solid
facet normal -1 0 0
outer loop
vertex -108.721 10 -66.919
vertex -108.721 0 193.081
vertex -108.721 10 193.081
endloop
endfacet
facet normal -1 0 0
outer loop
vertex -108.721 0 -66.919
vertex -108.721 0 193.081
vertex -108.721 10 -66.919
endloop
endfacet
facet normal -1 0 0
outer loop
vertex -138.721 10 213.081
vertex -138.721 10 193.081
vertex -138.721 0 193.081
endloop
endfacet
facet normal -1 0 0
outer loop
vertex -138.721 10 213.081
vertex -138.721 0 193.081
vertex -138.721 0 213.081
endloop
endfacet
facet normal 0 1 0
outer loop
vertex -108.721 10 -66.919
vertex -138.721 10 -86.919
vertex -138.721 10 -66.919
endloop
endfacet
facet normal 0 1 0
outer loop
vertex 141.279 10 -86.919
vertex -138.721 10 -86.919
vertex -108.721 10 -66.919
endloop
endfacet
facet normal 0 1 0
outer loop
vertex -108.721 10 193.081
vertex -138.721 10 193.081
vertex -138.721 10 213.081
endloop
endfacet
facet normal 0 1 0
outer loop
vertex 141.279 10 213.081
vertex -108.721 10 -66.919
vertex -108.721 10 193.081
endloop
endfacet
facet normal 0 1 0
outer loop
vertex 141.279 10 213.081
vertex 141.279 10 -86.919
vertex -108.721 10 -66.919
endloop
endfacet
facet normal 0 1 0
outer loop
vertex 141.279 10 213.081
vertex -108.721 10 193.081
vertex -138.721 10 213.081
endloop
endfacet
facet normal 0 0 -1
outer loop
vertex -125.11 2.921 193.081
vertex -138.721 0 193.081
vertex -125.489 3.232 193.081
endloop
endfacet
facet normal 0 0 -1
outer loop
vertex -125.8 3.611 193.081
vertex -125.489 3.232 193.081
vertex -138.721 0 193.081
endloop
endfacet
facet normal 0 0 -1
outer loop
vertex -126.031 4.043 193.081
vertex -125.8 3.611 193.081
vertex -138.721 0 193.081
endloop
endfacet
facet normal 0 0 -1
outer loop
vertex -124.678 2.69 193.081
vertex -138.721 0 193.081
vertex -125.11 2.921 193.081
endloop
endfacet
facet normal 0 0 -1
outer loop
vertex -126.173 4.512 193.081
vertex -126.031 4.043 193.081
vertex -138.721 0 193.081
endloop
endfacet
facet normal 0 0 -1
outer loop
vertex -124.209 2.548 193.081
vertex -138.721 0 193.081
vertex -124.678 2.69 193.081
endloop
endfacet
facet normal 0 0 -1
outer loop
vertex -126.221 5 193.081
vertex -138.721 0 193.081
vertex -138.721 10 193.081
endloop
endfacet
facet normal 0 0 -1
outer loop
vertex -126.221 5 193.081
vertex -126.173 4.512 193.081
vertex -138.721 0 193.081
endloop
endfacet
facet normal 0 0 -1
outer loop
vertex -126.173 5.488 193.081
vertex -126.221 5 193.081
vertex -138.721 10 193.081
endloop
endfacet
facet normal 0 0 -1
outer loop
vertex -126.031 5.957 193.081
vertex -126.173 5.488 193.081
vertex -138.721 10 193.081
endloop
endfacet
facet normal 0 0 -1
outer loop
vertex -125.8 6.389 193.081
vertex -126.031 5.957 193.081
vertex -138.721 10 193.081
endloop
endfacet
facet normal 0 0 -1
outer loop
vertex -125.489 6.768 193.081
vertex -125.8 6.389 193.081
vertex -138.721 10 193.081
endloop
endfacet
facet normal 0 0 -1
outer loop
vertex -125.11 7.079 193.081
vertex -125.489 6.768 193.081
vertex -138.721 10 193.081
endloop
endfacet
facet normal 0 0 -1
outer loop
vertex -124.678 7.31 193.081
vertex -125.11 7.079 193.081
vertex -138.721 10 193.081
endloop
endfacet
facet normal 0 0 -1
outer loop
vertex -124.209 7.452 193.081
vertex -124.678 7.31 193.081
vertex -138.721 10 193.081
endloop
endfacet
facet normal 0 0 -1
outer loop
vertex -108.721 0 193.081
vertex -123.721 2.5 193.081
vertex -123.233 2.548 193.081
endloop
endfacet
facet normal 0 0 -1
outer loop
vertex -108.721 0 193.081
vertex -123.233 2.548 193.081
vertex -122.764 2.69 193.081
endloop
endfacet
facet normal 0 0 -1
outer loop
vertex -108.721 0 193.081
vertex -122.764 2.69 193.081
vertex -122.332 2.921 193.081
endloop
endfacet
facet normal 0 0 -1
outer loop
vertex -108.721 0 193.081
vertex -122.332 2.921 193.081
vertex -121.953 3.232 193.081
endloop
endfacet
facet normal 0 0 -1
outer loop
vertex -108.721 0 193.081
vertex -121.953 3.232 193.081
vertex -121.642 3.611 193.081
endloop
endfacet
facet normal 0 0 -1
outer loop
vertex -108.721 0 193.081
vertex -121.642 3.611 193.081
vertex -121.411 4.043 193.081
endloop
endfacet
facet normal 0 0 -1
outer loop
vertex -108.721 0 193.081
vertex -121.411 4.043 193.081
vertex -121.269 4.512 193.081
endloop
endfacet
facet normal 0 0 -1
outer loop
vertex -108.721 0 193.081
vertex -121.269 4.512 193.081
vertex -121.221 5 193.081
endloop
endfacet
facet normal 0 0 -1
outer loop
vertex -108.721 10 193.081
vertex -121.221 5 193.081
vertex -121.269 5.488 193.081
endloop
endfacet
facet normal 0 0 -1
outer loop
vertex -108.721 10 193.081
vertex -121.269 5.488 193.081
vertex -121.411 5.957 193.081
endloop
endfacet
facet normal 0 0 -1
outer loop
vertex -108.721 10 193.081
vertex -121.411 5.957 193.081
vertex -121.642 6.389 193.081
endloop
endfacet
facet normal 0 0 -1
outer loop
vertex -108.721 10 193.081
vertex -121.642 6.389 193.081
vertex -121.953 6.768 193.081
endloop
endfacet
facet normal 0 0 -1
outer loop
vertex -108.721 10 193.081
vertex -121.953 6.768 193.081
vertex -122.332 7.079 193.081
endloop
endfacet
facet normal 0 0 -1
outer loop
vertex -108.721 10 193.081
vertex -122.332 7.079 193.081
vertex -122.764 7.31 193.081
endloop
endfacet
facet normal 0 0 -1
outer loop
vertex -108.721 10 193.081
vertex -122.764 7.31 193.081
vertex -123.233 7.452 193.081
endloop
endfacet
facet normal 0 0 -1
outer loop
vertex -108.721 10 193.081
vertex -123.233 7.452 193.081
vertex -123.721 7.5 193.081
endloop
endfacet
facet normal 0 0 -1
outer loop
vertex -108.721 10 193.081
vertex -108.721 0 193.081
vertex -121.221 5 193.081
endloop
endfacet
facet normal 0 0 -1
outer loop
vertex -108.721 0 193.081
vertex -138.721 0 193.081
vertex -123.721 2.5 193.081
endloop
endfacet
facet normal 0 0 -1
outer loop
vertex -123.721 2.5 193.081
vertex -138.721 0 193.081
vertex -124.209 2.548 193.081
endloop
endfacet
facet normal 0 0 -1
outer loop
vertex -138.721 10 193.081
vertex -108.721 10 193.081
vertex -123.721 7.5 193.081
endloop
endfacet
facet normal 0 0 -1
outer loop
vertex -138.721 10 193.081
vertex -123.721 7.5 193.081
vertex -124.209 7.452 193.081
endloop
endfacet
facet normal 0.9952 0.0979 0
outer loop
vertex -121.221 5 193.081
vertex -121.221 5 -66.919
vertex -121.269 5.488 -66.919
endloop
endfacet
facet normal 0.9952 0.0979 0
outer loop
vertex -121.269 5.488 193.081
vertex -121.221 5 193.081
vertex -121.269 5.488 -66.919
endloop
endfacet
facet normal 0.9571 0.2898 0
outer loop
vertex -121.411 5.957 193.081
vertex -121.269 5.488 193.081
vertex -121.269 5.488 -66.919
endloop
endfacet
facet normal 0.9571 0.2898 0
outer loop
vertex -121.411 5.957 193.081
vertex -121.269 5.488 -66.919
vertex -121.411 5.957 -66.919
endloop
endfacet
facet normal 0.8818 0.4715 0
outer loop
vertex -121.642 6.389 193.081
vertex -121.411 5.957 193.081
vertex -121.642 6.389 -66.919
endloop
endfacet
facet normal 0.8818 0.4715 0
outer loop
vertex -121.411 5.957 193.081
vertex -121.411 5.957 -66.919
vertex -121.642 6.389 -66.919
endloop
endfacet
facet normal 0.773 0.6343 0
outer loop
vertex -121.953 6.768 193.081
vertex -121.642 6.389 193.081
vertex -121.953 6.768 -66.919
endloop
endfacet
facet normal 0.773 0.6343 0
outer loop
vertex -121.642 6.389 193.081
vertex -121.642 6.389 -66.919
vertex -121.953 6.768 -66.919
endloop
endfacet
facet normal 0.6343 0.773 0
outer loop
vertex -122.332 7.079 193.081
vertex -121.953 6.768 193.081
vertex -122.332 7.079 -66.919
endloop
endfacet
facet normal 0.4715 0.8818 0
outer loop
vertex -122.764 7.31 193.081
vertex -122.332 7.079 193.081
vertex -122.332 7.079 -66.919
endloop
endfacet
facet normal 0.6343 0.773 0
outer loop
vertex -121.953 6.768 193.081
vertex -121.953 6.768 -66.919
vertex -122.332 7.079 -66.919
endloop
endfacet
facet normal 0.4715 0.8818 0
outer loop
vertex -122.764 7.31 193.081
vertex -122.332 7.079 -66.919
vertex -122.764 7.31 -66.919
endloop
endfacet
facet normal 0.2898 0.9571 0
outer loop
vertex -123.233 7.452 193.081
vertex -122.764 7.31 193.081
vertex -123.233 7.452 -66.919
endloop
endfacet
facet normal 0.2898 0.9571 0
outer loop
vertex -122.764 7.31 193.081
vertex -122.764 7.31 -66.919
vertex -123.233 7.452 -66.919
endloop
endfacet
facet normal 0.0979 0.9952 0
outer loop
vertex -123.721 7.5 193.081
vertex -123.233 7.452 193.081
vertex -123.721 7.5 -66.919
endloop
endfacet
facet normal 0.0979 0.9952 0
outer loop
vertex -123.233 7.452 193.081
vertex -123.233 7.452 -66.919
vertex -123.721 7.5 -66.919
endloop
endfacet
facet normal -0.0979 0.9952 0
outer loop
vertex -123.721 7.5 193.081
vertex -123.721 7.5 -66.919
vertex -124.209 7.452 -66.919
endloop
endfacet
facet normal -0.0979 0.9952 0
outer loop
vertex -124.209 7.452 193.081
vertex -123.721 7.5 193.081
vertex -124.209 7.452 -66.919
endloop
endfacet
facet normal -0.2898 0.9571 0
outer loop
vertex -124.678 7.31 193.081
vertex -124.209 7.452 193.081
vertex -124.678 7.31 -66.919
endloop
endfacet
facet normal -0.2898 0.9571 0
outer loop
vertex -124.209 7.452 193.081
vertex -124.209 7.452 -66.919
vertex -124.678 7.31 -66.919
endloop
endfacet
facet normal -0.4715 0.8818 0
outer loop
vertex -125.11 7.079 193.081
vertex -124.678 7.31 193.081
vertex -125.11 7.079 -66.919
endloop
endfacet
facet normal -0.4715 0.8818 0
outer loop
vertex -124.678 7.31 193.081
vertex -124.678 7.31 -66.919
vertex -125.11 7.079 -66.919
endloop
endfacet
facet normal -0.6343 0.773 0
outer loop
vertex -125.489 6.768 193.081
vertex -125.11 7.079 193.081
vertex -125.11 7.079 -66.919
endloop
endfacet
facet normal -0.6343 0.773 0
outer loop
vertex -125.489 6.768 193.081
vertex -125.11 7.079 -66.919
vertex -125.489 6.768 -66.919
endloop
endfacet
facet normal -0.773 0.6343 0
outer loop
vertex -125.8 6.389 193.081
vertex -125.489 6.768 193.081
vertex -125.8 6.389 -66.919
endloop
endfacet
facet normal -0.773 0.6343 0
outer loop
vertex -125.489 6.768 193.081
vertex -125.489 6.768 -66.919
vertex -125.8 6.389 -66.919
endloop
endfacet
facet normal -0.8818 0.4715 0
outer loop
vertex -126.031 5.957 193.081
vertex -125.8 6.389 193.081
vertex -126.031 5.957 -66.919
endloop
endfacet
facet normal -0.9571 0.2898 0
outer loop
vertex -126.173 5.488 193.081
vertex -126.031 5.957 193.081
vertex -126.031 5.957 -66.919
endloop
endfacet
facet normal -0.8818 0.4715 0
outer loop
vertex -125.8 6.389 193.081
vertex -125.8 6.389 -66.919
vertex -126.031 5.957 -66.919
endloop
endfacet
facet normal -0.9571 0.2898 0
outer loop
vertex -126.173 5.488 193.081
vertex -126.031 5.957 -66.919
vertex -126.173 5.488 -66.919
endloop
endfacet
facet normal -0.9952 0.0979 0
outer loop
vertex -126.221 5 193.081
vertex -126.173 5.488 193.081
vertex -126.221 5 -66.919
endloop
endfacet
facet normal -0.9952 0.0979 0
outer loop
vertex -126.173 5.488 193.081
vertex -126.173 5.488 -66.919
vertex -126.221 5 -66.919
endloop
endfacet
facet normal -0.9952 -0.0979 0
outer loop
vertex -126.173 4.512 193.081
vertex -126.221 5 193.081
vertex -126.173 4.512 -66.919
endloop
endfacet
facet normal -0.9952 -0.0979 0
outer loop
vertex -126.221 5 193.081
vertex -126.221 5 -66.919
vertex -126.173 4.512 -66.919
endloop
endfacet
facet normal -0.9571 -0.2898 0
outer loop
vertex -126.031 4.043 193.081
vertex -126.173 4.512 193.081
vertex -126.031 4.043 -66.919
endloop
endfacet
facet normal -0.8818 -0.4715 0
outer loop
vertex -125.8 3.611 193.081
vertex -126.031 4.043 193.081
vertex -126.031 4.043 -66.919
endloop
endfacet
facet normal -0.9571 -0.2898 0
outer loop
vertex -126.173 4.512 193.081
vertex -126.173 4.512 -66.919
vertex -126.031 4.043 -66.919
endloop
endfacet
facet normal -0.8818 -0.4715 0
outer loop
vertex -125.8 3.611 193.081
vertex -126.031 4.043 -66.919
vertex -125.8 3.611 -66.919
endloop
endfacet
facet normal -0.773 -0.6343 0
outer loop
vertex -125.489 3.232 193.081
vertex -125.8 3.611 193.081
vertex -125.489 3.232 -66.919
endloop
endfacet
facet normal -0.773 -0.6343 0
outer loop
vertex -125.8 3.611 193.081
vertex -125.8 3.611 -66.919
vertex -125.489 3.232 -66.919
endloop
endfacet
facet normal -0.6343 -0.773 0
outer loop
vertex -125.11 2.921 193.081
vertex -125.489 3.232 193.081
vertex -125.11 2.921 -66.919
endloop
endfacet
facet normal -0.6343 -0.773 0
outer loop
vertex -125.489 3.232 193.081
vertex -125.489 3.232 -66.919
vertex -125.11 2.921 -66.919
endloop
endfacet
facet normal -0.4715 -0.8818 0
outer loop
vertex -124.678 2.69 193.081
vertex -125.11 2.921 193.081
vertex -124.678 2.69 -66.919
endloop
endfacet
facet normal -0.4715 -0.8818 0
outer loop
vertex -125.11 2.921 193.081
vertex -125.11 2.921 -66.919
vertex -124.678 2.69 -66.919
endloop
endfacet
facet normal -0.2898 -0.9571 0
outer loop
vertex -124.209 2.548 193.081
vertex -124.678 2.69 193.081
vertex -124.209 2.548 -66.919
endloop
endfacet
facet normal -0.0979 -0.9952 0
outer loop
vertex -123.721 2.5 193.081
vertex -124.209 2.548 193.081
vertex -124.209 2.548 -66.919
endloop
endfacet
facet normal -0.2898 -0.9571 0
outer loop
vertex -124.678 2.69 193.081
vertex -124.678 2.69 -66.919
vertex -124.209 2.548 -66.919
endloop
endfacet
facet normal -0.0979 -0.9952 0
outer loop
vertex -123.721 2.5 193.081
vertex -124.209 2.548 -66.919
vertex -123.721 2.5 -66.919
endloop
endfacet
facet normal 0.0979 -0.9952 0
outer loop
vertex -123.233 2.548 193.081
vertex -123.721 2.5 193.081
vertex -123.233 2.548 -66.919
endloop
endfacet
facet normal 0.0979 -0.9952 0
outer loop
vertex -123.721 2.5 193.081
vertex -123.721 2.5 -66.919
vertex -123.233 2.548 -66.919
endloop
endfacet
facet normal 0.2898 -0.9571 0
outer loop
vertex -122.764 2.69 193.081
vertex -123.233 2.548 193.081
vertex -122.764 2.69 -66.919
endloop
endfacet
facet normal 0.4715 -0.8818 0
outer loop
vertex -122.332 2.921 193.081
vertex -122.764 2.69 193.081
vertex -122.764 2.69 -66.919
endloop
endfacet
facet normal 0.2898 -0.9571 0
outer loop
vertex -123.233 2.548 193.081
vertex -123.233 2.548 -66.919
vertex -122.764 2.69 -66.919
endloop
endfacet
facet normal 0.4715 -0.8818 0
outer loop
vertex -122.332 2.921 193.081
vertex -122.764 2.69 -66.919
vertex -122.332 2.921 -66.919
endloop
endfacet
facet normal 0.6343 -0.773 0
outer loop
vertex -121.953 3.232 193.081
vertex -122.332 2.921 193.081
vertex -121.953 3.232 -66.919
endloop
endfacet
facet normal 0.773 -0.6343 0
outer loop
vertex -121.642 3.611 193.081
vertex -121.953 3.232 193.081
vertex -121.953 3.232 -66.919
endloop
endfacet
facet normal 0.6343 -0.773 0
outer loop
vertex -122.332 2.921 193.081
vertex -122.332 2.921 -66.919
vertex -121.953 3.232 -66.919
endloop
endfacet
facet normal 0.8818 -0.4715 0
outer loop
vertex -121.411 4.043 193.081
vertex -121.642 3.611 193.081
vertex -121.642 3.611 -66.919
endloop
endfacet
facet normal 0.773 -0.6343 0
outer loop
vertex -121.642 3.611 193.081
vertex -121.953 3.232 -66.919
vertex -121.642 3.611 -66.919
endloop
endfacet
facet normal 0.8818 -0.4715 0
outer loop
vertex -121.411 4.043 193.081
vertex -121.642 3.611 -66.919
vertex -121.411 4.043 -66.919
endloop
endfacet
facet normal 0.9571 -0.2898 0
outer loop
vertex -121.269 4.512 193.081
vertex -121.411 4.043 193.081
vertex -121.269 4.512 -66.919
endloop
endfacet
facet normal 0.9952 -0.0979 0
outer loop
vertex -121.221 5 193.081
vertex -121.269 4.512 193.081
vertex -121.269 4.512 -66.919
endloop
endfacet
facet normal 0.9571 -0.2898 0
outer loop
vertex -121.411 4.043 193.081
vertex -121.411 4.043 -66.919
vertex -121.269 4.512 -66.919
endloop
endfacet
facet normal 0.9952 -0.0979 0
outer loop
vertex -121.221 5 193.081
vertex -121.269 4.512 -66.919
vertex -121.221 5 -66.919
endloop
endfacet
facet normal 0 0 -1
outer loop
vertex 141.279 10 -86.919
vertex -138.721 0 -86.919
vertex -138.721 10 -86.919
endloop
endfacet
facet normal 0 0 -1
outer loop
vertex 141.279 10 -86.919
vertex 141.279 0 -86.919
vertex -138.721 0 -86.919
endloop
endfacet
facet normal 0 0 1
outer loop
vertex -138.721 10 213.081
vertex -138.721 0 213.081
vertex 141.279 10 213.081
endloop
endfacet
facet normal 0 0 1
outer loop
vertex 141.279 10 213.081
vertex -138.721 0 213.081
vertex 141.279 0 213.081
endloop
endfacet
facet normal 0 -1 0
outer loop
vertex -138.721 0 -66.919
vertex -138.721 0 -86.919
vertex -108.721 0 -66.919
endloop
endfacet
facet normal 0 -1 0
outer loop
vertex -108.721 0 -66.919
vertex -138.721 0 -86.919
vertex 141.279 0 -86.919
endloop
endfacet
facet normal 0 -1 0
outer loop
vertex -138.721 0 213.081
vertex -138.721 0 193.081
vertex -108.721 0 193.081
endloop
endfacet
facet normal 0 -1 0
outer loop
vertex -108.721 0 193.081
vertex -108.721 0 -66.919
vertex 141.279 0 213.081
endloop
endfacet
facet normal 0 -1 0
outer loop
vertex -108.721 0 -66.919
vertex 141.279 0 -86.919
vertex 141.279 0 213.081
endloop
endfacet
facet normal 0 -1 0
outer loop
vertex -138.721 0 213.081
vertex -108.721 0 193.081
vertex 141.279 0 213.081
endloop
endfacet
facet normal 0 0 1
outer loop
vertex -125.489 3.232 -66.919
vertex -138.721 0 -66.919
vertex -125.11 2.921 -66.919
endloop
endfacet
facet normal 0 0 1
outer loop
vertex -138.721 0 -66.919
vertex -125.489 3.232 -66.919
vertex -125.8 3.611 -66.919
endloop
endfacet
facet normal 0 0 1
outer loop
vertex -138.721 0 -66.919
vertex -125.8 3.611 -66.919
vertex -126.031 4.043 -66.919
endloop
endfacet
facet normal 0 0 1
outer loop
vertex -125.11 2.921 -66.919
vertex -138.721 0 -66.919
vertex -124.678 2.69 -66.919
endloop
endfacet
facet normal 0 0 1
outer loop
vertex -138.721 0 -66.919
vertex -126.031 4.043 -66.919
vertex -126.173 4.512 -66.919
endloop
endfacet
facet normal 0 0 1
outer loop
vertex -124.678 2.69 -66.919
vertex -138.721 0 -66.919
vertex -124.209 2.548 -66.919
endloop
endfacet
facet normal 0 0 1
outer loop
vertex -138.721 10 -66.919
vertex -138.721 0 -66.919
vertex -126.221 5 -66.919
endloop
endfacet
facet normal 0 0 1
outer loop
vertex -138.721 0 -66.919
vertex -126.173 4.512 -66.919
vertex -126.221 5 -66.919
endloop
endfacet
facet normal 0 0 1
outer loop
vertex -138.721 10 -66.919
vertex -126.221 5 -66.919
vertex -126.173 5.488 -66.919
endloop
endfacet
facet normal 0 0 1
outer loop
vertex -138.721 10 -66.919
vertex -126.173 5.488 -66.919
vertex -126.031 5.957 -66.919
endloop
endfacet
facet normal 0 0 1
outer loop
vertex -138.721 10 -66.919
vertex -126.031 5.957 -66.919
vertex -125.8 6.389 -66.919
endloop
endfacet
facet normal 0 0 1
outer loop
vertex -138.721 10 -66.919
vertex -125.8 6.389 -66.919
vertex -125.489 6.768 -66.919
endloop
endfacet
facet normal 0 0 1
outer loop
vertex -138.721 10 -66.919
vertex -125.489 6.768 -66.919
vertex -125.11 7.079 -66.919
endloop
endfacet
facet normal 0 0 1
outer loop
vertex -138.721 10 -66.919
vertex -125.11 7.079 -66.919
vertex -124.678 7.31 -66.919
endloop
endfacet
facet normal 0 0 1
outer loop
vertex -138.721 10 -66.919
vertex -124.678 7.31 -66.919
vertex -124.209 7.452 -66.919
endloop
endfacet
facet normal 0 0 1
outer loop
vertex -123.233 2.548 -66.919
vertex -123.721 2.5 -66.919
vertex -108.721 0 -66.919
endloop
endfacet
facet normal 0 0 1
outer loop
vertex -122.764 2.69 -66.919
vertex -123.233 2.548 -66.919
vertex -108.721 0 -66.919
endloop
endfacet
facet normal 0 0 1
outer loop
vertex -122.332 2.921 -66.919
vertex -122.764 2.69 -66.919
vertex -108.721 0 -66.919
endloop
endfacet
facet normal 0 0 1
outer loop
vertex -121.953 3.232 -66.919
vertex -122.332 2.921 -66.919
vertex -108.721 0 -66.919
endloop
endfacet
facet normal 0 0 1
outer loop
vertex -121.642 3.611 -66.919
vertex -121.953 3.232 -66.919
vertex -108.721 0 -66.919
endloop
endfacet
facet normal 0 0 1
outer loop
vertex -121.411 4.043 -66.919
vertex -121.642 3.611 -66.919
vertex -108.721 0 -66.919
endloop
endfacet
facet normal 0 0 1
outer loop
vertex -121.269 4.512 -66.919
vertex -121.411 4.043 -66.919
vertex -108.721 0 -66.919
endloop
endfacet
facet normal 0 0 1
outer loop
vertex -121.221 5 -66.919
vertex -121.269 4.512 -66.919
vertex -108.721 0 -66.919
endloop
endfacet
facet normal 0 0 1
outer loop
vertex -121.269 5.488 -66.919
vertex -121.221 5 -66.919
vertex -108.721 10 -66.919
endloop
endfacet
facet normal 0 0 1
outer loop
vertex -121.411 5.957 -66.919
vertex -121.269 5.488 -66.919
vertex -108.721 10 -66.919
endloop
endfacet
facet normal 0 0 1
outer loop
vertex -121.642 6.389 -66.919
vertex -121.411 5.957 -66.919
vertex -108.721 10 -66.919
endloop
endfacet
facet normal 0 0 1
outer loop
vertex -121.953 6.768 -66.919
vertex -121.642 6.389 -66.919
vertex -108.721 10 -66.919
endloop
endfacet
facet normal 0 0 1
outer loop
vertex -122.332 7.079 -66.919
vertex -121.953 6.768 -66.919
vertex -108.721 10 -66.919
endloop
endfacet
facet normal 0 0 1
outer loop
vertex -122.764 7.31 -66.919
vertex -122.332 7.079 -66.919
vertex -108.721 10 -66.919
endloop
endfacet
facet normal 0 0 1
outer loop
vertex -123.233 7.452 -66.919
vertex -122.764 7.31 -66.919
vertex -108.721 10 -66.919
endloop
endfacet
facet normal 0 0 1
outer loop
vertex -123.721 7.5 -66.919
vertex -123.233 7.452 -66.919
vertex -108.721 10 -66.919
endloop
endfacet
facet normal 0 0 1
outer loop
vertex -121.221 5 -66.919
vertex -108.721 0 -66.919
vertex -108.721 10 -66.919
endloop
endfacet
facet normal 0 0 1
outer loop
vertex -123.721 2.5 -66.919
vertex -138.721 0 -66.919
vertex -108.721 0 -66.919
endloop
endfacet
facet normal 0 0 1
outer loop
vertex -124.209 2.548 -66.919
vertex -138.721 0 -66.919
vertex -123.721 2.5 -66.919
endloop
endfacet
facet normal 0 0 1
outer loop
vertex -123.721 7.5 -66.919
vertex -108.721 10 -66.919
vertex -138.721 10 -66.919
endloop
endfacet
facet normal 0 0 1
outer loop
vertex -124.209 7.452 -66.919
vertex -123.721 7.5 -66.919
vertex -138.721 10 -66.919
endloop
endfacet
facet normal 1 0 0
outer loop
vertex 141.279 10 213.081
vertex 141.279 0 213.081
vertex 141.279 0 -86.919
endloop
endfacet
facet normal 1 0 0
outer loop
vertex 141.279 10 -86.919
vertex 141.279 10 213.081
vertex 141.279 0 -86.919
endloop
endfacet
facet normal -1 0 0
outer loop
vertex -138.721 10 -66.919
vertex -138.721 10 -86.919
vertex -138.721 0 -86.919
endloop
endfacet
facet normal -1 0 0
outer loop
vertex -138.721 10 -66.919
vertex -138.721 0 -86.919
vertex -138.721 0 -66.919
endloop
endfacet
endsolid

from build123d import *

# Parameters (mm, degrees)
SKETCH1_W           = 250
SKETCH1_H           = 300
BOSS_EXTRUDE1_DEPTH = 10
SKETCH2_W           = 20
SKETCH2_H           = 10
BOSS_EXTRUDE2_DEPTH = 30
SKETCH3_R           = 2.5
BOSS_EXTRUDE3_DEPTH = 260


with BuildPart() as part:
    # Sketch1 → Boss-Extrude1 (new body)
    with BuildSketch(Plane(origin=(0, 0, 0), x_dir=(1, 0, 0), z_dir=(0, 1, 0))):
        with Locations((16.279069767, -63.081395349)):
            Rectangle(SKETCH1_W, SKETCH1_H)
    extrude(amount=BOSS_EXTRUDE1_DEPTH)

    # Sketch2 → Boss-Extrude2 (add)
    with BuildSketch(Plane.ZY.offset(108.720930233)):
        with Locations((-76.918604651, 5)):
            Rectangle(SKETCH2_W, SKETCH2_H)
        with Locations((203.081395349, 5)):
            Rectangle(SKETCH2_W, SKETCH2_H)
    extrude(amount=BOSS_EXTRUDE2_DEPTH)

    # Sketch3 → Boss-Extrude3 (add)
    with BuildSketch(Plane.XY.offset(-66.918604651)):
        with Locations((-123.720930233, 5)):
            Circle(SKETCH3_R)
    extrude(amount=BOSS_EXTRUDE3_DEPTH)


solid = part.part
